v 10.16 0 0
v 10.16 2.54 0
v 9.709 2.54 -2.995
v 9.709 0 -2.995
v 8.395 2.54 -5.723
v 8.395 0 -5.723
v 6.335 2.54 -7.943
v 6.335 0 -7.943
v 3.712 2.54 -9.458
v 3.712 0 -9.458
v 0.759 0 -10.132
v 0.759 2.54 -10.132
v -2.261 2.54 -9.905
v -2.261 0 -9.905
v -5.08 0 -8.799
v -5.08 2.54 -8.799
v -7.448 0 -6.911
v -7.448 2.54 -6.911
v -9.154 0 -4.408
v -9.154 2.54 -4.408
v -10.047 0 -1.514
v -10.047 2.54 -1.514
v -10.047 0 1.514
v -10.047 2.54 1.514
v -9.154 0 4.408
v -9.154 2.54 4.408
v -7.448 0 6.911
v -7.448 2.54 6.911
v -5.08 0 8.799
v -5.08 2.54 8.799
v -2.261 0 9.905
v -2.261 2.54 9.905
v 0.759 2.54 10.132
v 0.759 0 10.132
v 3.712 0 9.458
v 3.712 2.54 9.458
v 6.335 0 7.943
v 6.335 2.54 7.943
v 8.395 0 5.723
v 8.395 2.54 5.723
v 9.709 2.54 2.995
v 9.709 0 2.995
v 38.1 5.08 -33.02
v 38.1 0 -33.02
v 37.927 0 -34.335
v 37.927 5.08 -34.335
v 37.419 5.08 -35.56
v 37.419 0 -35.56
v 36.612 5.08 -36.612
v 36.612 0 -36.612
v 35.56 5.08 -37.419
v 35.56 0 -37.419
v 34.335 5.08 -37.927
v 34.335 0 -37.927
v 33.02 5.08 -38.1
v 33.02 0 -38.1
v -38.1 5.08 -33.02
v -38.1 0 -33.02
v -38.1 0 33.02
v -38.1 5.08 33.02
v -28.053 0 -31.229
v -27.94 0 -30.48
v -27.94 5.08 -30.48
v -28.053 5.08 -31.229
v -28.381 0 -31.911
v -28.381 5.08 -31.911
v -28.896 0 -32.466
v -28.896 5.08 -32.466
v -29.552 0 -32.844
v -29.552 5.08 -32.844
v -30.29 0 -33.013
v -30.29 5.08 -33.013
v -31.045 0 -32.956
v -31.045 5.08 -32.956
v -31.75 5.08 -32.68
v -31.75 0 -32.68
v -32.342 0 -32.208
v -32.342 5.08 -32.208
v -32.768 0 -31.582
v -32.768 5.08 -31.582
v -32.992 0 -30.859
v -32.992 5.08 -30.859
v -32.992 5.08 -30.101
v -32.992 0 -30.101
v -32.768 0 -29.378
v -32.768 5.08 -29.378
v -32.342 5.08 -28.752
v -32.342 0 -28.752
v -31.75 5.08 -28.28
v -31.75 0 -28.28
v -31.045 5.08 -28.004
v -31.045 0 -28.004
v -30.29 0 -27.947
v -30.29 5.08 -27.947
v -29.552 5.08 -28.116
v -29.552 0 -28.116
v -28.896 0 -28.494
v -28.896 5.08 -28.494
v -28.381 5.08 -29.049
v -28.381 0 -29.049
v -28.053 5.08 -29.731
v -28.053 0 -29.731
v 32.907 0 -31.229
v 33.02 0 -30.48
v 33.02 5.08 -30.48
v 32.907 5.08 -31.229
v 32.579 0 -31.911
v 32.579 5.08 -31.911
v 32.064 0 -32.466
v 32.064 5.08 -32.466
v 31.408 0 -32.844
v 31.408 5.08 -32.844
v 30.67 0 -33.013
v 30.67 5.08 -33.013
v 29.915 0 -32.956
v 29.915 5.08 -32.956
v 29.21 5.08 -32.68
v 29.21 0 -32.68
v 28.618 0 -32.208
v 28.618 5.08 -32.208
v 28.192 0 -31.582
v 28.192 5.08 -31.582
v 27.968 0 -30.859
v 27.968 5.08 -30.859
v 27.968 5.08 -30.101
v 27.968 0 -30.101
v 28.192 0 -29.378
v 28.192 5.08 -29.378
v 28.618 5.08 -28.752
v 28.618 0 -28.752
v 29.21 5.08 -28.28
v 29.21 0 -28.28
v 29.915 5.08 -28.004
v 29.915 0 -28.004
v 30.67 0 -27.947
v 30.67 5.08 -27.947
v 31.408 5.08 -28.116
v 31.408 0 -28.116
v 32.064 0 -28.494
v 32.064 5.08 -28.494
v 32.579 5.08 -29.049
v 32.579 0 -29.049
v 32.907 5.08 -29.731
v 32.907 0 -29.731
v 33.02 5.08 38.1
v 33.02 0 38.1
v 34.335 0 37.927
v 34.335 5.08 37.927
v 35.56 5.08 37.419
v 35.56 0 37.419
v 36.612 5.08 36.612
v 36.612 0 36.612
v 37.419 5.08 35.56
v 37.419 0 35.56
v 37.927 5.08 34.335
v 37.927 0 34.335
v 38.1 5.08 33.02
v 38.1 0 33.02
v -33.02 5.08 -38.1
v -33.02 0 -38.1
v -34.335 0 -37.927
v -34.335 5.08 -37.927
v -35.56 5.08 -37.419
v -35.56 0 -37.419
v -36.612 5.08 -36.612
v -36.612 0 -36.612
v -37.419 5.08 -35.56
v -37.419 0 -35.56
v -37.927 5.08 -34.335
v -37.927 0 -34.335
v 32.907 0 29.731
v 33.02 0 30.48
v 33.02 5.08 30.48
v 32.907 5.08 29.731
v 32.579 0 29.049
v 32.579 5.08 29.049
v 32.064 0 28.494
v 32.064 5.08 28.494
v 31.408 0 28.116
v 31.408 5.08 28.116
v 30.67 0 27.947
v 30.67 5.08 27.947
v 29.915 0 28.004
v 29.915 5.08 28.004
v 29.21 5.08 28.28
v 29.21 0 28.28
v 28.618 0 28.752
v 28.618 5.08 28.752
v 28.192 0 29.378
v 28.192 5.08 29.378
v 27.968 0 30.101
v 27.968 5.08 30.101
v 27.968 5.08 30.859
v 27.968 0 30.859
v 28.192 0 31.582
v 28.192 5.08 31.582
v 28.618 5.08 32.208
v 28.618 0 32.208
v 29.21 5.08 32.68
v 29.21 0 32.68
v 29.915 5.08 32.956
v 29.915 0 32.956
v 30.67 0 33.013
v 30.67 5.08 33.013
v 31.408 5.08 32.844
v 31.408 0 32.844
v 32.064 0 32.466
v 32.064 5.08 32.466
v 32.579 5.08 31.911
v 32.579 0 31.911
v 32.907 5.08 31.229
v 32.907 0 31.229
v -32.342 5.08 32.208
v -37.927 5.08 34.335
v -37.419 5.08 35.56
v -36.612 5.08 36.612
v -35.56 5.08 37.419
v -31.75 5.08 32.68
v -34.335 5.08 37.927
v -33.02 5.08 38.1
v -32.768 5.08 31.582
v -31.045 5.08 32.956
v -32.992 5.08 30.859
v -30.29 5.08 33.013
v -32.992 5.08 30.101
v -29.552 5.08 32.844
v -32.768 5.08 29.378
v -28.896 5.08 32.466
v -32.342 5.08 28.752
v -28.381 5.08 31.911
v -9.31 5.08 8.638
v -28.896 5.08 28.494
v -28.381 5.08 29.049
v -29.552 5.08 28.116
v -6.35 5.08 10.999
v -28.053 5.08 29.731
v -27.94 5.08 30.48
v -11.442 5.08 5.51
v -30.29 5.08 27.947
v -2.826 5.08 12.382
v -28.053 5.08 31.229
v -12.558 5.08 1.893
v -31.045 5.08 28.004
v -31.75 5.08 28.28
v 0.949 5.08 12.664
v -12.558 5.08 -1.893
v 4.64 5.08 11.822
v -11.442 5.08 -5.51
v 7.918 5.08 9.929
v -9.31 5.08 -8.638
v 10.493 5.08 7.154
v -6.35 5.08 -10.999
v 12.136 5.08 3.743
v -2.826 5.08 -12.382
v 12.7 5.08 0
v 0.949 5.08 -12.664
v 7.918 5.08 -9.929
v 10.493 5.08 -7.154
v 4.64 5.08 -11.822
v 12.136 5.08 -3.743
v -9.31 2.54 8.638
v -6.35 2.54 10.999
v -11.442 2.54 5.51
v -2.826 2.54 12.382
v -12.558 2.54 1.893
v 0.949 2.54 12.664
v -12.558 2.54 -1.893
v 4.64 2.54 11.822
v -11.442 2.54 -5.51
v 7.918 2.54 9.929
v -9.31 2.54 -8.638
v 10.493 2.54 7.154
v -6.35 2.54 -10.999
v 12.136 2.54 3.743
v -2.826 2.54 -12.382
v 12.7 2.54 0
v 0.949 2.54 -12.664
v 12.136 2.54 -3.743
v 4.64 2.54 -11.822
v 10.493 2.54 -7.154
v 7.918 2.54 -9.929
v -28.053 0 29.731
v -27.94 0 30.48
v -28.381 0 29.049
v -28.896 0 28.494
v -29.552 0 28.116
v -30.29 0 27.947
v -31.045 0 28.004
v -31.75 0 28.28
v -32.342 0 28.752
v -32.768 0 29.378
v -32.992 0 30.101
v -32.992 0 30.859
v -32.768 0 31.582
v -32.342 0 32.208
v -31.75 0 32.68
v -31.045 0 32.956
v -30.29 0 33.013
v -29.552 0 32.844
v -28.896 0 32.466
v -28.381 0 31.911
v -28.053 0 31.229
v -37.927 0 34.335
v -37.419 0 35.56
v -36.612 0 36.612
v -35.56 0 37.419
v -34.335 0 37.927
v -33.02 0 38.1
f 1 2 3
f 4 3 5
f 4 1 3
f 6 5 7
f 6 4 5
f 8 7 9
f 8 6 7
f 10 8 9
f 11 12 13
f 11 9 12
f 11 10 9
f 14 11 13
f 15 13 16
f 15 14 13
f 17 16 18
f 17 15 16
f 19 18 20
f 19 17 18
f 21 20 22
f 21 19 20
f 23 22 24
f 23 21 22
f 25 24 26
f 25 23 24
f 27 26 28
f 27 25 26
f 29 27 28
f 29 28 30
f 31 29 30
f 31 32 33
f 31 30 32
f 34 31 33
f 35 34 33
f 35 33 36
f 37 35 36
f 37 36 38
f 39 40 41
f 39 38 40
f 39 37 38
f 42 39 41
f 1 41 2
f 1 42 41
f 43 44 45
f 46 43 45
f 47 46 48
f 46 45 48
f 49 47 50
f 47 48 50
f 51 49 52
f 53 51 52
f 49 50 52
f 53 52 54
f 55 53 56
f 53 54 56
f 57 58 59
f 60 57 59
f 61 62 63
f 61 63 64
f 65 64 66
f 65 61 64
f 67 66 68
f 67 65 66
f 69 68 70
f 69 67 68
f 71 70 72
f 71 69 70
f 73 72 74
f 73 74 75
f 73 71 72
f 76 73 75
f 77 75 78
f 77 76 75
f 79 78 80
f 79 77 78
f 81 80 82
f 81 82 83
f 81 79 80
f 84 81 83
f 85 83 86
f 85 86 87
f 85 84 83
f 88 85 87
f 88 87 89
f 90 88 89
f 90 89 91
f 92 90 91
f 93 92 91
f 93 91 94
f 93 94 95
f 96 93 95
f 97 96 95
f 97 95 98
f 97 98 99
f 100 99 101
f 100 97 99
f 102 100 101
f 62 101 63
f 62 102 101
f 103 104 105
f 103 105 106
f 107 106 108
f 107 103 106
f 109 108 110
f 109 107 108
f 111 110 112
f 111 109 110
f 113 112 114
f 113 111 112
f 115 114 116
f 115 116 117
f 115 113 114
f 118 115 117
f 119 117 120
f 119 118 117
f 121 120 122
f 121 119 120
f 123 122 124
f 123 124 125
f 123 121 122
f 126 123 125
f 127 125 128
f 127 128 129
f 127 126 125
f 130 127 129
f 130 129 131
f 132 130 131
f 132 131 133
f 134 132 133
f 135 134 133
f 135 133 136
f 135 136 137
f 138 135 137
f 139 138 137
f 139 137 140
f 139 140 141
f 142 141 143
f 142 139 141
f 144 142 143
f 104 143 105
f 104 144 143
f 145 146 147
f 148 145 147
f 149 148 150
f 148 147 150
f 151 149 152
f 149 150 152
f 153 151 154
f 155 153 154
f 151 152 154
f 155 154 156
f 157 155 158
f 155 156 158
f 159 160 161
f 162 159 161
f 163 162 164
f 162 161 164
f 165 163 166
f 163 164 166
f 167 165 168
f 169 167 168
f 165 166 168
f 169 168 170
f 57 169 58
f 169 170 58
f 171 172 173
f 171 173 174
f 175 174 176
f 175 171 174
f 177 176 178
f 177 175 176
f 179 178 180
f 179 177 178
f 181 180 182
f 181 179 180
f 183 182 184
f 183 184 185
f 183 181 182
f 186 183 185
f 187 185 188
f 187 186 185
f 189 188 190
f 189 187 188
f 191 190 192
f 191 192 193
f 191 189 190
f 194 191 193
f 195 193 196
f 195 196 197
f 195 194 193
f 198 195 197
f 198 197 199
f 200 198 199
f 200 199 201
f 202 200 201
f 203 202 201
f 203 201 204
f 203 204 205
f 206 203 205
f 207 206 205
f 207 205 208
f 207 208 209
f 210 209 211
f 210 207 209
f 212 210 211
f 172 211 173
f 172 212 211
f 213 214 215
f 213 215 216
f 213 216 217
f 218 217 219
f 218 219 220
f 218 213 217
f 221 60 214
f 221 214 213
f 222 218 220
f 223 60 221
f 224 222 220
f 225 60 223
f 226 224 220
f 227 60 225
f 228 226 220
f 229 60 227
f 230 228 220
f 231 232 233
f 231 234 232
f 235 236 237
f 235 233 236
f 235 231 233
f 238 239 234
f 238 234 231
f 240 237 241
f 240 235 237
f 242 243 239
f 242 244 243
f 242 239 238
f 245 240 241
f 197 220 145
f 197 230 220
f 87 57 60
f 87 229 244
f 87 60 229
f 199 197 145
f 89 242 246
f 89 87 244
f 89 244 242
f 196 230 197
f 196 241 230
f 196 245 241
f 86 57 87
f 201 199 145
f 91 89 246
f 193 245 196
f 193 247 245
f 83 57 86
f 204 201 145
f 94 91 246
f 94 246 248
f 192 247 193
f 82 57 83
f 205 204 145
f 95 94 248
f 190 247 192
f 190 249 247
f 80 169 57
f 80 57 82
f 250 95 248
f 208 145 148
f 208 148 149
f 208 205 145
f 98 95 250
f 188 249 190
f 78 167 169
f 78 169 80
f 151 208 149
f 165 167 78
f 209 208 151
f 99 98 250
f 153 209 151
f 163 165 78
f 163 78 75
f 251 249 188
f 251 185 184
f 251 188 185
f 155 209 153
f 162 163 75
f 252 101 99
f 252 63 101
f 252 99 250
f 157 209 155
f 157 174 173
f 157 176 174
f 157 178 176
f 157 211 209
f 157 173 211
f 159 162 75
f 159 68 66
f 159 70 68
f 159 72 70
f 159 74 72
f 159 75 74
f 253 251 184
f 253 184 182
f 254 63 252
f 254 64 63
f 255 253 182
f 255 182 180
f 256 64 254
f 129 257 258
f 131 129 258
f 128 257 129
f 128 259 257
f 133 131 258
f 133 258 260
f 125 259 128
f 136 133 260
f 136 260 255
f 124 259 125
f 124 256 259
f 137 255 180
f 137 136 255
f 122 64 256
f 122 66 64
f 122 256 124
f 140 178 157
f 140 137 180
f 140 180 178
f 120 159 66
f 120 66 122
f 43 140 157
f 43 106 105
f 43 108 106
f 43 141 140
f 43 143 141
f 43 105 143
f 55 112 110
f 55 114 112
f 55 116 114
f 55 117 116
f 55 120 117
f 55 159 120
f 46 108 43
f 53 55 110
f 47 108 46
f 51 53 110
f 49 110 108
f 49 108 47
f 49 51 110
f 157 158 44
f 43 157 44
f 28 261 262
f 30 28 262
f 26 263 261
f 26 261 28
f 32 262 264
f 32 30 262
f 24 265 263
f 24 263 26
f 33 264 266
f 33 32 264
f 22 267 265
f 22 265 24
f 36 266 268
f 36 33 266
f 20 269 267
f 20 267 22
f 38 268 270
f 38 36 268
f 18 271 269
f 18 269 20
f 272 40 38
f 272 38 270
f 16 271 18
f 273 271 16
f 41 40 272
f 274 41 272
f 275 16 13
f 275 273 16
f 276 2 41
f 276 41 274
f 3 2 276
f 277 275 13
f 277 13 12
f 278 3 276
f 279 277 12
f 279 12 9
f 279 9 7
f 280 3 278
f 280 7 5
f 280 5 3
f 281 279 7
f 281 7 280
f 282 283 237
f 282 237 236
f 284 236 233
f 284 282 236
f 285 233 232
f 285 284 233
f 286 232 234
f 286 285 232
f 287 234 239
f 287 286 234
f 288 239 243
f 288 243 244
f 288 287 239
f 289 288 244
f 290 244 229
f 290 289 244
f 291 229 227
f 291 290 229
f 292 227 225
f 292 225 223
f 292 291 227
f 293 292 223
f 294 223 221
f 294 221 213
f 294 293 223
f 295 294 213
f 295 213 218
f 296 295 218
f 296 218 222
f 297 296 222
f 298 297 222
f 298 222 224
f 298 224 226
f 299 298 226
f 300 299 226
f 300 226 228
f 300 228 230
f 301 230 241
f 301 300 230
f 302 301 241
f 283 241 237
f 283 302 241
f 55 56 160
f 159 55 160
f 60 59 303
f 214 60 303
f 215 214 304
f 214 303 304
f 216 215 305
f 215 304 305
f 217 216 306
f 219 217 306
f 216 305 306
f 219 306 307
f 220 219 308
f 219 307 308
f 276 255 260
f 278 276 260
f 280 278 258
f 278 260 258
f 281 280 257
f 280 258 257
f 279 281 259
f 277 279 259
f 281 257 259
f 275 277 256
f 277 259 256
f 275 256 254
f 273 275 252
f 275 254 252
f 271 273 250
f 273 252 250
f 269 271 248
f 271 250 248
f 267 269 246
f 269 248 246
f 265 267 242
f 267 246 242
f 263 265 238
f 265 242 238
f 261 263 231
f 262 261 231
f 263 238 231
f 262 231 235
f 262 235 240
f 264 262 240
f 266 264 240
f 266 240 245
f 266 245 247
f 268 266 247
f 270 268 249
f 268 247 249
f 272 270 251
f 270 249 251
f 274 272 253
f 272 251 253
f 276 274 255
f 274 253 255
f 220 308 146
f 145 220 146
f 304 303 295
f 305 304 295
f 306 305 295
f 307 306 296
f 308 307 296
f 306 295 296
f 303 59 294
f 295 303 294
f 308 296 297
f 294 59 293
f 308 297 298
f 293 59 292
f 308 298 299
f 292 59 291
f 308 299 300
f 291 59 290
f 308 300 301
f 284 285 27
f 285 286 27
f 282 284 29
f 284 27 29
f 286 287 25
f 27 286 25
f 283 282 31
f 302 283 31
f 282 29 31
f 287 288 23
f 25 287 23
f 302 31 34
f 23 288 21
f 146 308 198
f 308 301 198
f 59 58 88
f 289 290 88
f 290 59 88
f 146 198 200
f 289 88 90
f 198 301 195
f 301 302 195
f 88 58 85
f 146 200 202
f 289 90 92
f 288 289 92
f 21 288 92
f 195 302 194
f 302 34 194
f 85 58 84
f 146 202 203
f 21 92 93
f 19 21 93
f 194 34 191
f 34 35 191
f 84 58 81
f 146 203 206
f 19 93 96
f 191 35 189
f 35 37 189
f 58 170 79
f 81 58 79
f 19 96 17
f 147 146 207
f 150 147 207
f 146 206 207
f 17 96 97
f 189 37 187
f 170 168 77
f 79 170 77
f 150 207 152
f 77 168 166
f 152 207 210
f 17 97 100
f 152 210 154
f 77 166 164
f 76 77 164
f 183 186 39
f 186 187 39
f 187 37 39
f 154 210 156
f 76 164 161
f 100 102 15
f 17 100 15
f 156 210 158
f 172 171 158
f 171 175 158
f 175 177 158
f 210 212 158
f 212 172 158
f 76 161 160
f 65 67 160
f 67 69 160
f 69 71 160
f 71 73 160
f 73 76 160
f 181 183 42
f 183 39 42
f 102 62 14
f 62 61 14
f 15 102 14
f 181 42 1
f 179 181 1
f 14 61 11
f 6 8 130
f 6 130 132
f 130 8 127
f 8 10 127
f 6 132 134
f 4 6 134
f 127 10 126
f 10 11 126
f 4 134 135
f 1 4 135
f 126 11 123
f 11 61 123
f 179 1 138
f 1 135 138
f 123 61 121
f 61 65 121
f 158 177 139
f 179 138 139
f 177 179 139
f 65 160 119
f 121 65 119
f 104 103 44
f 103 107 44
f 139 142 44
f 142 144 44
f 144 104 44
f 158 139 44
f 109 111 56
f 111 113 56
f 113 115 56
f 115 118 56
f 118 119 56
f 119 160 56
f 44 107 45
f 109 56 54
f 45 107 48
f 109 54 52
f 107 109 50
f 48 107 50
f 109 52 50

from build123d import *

# Parameters (mm, degrees)
SKETCH1_R           = 10.16
SKETCH1_R_2         = 2.54
BOSS_EXTRUDE1_DEPTH = 5.08
SKETCH2_R           = 12.7
CUT_EXTRUDE1_DEPTH  = 2.54


with BuildPart() as part:
    # Sketch1 → Boss-Extrude1 (new body)
    with BuildSketch(Plane(origin=(0, 0, 0), x_dir=(1, 0, 0), z_dir=(0, 1, 0))):
        with BuildLine():
            Line((-33.02, -38.1), (33.02, -38.1))
            ThreePointArc((33.02, -38.1), (36.612102448, -36.612102448), (38.1, -33.02))
            Line((38.1, -33.02), (38.1, 33.02))
            ThreePointArc((38.1, 33.02), (36.612102448, 36.612102448), (33.02, 38.1))
            Line((33.02, 38.1), (-33.02, 38.1))
            ThreePointArc((-33.02, 38.1), (-36.612102448, 36.612102448), (-38.1, 33.02))
            Line((-38.1, 33.02), (-38.1, -33.02))
            ThreePointArc((-38.1, -33.02), (-36.612102448, -36.612102448), (-33.02, -38.1))
        make_face()
        Circle(SKETCH1_R, mode=Mode.SUBTRACT)
        with Locations((-30.48, 30.48)):
            Circle(SKETCH1_R_2, mode=Mode.SUBTRACT)
        with Locations((30.48, 30.48)):
            Circle(SKETCH1_R_2, mode=Mode.SUBTRACT)
        with Locations((30.48, -30.48)):
            Circle(SKETCH1_R_2, mode=Mode.SUBTRACT)
        with Locations((-30.48, -30.48)):
            Circle(SKETCH1_R_2, mode=Mode.SUBTRACT)
    extrude(amount=BOSS_EXTRUDE1_DEPTH)

    # Sketch2 → Cut-Extrude1 (cut)
    with BuildSketch(Plane(origin=(0, 5.08, 0), x_dir=(1, 0, 0), z_dir=(0, 1, 0))):
        Circle(SKETCH2_R)
    extrude(amount=-CUT_EXTRUDE1_DEPTH, mode=Mode.SUBTRACT)


solid = part.part
